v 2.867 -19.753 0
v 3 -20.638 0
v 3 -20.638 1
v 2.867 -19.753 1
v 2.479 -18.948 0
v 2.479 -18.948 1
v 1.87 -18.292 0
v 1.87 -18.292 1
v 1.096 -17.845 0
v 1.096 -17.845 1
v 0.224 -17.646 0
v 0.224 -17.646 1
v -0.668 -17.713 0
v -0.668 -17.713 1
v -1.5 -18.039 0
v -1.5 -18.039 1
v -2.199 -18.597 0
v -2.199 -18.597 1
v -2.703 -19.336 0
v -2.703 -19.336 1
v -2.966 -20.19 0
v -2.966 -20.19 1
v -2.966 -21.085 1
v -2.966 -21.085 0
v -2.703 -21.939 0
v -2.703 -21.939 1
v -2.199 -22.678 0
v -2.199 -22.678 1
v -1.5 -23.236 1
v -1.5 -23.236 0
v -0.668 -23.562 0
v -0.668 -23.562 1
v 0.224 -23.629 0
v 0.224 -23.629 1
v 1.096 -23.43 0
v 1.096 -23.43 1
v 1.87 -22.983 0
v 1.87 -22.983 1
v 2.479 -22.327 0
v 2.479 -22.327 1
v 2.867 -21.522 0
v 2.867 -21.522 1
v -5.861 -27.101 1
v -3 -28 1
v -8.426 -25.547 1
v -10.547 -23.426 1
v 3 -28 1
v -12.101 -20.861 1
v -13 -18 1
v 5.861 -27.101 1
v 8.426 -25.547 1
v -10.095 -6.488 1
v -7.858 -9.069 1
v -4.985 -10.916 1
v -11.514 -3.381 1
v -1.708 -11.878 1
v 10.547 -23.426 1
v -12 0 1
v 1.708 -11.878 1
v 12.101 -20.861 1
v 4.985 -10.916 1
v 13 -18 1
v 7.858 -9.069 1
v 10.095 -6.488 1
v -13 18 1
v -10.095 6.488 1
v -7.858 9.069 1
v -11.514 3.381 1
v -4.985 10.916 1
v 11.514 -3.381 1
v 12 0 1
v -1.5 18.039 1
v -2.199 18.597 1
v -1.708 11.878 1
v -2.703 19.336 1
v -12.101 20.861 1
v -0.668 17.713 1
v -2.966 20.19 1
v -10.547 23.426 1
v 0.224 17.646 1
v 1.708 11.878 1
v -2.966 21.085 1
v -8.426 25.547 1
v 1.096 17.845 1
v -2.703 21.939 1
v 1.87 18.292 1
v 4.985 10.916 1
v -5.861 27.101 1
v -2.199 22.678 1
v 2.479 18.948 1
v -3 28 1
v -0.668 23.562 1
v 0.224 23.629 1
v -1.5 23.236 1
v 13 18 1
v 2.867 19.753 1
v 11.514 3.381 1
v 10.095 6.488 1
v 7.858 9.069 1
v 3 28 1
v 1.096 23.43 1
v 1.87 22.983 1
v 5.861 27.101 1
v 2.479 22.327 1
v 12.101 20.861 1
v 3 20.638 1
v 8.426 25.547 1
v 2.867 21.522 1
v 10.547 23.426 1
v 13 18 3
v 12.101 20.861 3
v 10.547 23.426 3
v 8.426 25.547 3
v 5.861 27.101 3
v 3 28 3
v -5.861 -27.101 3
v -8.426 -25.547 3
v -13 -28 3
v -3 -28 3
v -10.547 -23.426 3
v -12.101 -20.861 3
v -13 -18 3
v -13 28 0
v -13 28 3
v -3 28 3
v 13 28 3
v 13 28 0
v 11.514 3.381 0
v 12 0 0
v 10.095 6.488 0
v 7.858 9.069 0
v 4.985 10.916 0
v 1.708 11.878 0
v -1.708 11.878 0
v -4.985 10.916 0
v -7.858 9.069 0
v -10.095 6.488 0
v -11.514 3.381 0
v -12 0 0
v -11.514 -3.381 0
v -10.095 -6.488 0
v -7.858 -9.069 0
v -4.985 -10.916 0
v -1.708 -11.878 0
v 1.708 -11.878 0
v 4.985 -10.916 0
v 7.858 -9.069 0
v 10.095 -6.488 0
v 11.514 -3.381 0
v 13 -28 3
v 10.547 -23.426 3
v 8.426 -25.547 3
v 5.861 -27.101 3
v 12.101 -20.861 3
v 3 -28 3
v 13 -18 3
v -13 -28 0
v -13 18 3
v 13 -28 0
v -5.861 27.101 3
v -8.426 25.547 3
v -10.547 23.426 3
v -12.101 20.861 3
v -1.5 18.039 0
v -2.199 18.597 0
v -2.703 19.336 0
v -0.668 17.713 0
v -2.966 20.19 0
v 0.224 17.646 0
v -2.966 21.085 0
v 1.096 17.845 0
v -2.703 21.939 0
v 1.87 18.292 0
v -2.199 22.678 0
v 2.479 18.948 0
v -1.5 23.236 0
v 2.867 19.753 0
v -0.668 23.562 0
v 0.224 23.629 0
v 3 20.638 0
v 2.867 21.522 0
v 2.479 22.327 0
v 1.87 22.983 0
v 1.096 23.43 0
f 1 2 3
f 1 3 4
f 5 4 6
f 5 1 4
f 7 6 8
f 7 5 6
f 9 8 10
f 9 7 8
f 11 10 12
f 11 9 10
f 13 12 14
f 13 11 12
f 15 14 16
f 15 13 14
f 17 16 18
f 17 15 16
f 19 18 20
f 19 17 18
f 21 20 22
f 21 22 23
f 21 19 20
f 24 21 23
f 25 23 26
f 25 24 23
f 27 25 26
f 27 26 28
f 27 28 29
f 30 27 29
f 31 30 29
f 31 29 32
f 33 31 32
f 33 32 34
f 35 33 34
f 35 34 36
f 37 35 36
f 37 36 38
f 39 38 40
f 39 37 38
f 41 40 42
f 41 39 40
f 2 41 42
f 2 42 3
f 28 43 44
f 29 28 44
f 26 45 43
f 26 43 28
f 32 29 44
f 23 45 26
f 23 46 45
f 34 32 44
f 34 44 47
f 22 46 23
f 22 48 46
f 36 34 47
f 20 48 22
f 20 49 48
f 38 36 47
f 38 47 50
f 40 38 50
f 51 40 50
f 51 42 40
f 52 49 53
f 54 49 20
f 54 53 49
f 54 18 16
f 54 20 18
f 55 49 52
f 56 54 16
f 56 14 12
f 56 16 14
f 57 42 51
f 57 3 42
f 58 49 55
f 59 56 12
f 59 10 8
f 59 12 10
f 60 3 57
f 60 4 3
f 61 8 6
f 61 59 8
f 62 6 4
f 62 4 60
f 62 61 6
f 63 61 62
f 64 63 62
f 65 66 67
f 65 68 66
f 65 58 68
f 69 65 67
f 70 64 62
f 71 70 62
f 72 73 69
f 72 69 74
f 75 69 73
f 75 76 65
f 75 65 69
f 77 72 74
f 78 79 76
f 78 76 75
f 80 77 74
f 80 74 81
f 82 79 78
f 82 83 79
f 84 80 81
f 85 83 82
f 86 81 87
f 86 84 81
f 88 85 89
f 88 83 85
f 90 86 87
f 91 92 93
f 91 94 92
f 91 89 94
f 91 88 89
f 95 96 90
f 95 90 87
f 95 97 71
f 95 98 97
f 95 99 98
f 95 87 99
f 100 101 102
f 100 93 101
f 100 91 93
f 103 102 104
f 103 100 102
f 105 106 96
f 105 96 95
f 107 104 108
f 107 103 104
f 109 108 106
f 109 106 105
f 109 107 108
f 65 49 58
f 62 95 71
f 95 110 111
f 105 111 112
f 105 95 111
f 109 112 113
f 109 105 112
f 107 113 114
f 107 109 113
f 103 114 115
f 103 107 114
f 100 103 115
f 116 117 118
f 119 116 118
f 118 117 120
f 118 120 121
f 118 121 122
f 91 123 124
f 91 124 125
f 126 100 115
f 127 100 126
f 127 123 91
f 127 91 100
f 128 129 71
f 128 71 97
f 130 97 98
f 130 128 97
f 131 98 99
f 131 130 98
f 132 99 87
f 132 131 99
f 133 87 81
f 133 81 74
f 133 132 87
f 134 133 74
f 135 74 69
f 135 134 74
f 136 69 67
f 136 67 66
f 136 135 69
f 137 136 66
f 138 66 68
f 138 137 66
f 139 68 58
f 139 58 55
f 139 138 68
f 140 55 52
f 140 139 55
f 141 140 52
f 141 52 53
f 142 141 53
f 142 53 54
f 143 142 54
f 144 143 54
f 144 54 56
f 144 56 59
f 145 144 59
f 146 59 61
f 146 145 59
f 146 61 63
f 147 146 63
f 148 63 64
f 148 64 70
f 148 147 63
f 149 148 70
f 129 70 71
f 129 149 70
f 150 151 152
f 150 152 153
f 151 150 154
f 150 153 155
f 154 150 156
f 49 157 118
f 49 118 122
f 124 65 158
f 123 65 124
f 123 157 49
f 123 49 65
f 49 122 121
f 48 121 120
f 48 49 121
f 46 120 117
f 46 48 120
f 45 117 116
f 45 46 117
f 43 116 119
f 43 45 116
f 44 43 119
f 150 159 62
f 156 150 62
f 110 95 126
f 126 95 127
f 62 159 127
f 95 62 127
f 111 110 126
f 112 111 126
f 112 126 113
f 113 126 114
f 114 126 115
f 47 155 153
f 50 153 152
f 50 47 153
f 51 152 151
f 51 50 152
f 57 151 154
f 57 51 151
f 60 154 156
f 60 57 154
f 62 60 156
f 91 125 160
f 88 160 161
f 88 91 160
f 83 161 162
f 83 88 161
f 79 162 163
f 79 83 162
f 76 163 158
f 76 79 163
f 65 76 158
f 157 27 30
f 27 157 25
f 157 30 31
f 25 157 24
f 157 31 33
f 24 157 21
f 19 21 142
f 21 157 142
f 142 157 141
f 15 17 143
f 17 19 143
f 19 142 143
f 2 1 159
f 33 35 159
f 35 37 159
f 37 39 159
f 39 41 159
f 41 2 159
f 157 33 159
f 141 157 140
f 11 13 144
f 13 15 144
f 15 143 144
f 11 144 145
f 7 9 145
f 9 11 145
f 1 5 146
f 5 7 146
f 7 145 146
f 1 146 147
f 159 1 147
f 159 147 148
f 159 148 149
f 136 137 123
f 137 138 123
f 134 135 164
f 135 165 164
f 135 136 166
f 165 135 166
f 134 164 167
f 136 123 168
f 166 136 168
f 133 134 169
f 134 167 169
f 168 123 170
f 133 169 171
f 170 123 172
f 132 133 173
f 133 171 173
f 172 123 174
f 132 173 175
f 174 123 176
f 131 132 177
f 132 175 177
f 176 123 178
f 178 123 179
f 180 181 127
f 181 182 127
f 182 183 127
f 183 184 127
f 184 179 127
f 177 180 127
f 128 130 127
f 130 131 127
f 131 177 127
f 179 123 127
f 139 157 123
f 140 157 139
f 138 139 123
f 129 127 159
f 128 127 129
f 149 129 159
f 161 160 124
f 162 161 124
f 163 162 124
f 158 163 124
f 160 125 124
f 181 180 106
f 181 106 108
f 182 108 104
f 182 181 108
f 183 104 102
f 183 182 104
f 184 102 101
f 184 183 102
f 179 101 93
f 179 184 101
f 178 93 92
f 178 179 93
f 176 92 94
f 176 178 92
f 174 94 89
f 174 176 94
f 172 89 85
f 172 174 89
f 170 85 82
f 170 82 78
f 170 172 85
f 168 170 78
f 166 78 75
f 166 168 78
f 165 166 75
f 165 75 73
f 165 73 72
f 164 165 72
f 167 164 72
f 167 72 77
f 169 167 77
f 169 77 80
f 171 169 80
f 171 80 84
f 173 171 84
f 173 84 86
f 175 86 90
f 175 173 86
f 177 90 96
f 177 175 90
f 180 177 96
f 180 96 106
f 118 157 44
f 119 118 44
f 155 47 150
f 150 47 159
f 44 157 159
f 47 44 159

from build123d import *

# Parameters (mm, degrees)
SKETCH_W     = 26
SKETCH_H     = 56
SKETCH_R     = 3
SKETCH_R_2   = 12
PAD_DEPTH    = 1
PAD001_DEPTH = 3


with BuildPart() as part:
    # Sketch → Pad (new body)
    with BuildSketch(Plane.XY):
        Rectangle(SKETCH_W, SKETCH_H)
        with Locations((0, 20.6375)):
            Circle(SKETCH_R, mode=Mode.SUBTRACT)
        with Locations((0, -20.6375)):
            Circle(SKETCH_R, mode=Mode.SUBTRACT)
        Circle(SKETCH_R_2, mode=Mode.SUBTRACT)
    extrude(amount=PAD_DEPTH)

    # Sketch001 → Pad001 (join)
    with BuildSketch(Plane.XY):
        with BuildLine():
            ThreePointArc((-3, 28), (-9.550145, 24.550145), (-13, 18))
            Line((-13, 18), (-13, 28))
            Line((-13, 28), (-3, 28))
        make_face()
        with BuildLine():
            ThreePointArc((13, 18), (9.550145, 24.550145), (3, 28))
            Line((13, 28), (3, 28))
            Line((13, 18), (13, 28))
        make_face()
        with BuildLine():
            ThreePointArc((-13, -18), (-9.550145, -24.550145), (-3, -28))
            Line((-13, -28), (-3, -28))
            Line((-13, -18), (-13, -28))
        make_face()
        with BuildLine():
            ThreePointArc((3, -28), (9.550145, -24.550145), (13, -18))
            Line((13, -28), (13, -18))
            Line((3, -28), (13, -28))
        make_face()
    extrude(amount=PAD001_DEPTH)


solid = part.part
